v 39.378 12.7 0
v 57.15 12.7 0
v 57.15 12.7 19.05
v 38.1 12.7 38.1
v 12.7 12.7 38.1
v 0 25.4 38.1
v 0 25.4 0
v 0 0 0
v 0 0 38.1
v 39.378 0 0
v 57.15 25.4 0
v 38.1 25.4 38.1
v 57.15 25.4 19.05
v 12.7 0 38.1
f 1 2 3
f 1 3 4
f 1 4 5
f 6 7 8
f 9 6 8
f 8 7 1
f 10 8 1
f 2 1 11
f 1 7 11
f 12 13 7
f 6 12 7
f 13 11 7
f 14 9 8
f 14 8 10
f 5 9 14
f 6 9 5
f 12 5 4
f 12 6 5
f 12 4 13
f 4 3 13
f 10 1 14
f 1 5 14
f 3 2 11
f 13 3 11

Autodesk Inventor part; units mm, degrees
ref_plane "YZ Plane" through (0, 0, 0) normal (1, 0, 0) x (0, 1, 0)
ref_plane "XZ Plane" through (0, 0, 0) normal (0, 1, 0) x (-1, 0, 0)
ref_plane "XY Plane" through (0, 0, 0) normal (0, 0, 1) x (1, 0, 0)
sketch "Sketch1" plane through (0, 0, 0) normal (0, 0, 1) x (1, 0, 0)
  line L0 (0, 0) -> (57.15, 0)
  line L1 (57.15, 0) -> (57.15, 25.4)
  line L2 (57.15, 25.4) -> (0, 25.4)
  line L3 (0, 25.4) -> (0, 0)
  dimension "d0" = 57.15
  dimension "d1" = 25.4
extrude "Extrusion1" add sketch "Sketch1" along normal blind 38.1
sketch "Sketch2" plane through (0, 0, 38.1) normal (0, 0, 1) x (1, 0, 0)
  point P0 (0, 0)
sketch "Sketch3" plane through (0, 0, 38.1) normal (0, 0, 1) x (1, 0, 0)
  line L0 (57.355, 0) -> (57.15, 12.7)
  line L1 (57.15, 0) -> (57.15, 25.4) projected
  line L2 (57.15, 12.7) -> (12.7, 12.7)
  line L3 (12.7, 12.7) -> (12.7, 0)
  line L4 (0, 0) -> (57.15, 0) projected
  line L5 (57.15, 0) -> (12.7, 0)
  dimension "d4" = 44.45
extrude "Extrusion2" cut sketch "Sketch3" against normal blind 38.1
draft "FaceDraft1" angle 35 pull direction (0, 0, 1) faces at (12.7, 8.4667, 25.4) fixed edges at (12.7, 6.35, 38.1)
chamfer "Chamfer1" distance 19.05 angle 45 1 edges at (57.15, 19.05, 38.1)
properties part number "Unit 7.1 part 4"
